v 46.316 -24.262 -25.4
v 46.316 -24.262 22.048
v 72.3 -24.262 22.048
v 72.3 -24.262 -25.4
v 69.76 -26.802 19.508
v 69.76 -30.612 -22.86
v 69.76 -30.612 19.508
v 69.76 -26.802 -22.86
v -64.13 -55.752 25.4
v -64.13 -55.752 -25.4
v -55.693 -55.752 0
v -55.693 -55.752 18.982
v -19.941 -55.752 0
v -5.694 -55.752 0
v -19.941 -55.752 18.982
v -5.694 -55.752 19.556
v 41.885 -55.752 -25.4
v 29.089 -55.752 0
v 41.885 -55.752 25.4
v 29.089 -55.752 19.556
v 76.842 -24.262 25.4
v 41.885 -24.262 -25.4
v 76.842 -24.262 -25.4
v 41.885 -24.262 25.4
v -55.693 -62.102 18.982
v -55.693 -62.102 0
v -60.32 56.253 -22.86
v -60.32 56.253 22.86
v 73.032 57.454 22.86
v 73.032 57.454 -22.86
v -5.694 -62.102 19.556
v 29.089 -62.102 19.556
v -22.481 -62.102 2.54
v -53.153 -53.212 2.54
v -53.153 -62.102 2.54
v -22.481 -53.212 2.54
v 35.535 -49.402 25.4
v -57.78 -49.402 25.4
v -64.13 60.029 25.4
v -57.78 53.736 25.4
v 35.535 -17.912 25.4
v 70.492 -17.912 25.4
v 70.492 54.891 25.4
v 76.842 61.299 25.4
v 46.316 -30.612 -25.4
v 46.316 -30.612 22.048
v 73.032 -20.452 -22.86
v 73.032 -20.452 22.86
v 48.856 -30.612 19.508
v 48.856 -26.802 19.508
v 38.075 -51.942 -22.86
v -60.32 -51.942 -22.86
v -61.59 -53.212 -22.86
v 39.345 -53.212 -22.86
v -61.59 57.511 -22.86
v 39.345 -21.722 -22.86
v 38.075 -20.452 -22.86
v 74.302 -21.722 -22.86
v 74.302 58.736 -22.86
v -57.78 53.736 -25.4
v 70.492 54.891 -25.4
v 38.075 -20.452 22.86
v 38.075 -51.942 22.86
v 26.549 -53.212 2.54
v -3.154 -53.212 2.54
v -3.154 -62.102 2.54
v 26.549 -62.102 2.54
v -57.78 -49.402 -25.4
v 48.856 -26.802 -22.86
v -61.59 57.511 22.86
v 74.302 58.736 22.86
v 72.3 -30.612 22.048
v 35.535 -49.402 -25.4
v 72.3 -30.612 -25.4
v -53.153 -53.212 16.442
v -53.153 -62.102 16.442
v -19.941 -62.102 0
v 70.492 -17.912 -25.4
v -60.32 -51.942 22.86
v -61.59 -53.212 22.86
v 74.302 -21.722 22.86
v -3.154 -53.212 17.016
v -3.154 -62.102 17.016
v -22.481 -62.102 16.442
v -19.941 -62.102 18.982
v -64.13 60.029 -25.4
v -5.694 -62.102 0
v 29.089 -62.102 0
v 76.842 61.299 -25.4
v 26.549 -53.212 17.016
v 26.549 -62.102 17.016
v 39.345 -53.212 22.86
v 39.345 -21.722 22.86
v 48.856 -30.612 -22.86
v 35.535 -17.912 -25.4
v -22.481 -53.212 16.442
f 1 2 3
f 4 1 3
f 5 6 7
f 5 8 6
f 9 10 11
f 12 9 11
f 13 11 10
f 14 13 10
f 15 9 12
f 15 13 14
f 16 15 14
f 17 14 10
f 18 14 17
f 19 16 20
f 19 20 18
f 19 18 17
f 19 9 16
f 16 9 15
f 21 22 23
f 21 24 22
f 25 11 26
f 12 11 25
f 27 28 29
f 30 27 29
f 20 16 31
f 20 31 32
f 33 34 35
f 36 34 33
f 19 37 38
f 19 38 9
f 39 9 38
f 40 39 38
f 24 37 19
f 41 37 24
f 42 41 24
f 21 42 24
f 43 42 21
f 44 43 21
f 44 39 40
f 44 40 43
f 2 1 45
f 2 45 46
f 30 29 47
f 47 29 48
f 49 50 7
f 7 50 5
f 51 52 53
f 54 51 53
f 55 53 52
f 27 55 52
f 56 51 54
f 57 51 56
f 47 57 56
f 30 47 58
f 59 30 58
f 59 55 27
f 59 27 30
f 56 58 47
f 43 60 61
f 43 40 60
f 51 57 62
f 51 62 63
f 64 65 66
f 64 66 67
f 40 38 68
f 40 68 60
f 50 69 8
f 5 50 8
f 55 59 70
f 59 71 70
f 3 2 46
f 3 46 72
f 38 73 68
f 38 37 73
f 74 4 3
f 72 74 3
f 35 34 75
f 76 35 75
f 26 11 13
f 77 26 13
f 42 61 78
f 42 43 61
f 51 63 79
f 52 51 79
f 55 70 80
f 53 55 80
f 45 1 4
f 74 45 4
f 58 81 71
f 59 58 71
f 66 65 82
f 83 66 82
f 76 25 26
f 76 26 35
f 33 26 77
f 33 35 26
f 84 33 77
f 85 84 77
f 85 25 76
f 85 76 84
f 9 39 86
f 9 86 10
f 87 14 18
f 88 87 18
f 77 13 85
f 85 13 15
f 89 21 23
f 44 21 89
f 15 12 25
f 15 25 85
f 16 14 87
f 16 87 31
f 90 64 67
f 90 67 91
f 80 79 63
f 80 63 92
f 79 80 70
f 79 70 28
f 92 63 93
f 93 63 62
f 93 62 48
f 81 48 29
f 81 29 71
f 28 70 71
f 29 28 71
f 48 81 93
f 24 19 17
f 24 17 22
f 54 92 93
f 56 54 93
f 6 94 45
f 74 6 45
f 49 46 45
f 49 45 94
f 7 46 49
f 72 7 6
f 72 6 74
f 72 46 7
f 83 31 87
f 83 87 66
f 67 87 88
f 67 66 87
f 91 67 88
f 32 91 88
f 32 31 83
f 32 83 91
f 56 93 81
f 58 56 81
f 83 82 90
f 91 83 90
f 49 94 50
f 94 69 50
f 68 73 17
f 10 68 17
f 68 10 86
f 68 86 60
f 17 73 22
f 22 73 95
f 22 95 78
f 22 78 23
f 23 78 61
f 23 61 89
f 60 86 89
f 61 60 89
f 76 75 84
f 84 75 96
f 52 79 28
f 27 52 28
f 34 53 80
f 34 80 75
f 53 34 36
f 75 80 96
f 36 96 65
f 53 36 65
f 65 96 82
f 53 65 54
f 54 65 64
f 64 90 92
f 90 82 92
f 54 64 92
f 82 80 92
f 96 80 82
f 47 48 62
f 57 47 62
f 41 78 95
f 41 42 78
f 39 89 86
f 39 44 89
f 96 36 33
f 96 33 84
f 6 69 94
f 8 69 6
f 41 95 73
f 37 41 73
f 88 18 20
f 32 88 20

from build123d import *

# Parameters (mm, degrees)
F1_DEPTH = 25.4
F2_W     = 35.7521809638
F2_H     = 18.9824756235
F2_W_2   = 34.7827696241
F2_H_2   = 19.5560809225
F3_DEPTH = 6.35
F4_W     = 25.9840600193
F4_H     = 47.4477748662
F5_DEPTH = 6.35
F6_T     = -2.54
F6_2_T   = -2.54


with BuildPart() as f1:
    # F0 (on Top) → F1 (new body, symmetric)
    with BuildSketch(Plane.XY):
        Polygon((76.8418429255, 61.2986564827), (-64.1302062035, 60.0286343337), (-64.1302062035, -55.7520804763), (41.884825176, -55.7520804763), (41.884825176, -24.2618681699), (76.8418429255, -24.2618681699), align=None)
        Polygon((-57.7802062035, -49.4020804763), (-57.7802062035, 53.7355840206), (70.4918429255, 54.8911914229), (70.4918429255, -17.9118681699), (35.534825176, -17.9118681699), (35.534825176, -49.4020804763), align=None, mode=Mode.SUBTRACT)
    extrude(amount=F1_DEPTH, both=True)

    # F2 (on face) → F3 (join)
    with BuildSketch(Plane.XZ.offset(55.7520804763)):
        with Locations((-37.8169622272, 9.4912378117)):
            Rectangle(F2_W, F2_H)
        with Locations((11.697415961, 9.7780404612)):
            Rectangle(F2_W_2, F2_H_2)
    extrude(amount=F3_DEPTH)

    # F6
    f6_openings = [f1.faces().sort_by_distance(p)[0] for p in [
        (-37.816962, -62.10208, 9.491238),
        (11.697416, -62.10208, 9.77804),
    ]]
    offset(amount=F6_T, openings=f6_openings, kind=Kind.INTERSECTION)


with BuildPart() as f5:
    # F4 (on face) → F5 (new body)
    with BuildSketch(Plane.XZ.offset(24.2618681699)):
        with Locations((59.3077857047, -1.6761125669)):
            Rectangle(F4_W, F4_H)
    extrude(amount=F5_DEPTH)

    # F6#2
    f6_2_openings = [f5.faces().sort_by_distance(p)[0] for p in [
        (59.307786, -30.611868, -1.676113),
    ]]
    offset(amount=F6_2_T, openings=f6_2_openings)


solid = Compound([f1.part, f5.part])
